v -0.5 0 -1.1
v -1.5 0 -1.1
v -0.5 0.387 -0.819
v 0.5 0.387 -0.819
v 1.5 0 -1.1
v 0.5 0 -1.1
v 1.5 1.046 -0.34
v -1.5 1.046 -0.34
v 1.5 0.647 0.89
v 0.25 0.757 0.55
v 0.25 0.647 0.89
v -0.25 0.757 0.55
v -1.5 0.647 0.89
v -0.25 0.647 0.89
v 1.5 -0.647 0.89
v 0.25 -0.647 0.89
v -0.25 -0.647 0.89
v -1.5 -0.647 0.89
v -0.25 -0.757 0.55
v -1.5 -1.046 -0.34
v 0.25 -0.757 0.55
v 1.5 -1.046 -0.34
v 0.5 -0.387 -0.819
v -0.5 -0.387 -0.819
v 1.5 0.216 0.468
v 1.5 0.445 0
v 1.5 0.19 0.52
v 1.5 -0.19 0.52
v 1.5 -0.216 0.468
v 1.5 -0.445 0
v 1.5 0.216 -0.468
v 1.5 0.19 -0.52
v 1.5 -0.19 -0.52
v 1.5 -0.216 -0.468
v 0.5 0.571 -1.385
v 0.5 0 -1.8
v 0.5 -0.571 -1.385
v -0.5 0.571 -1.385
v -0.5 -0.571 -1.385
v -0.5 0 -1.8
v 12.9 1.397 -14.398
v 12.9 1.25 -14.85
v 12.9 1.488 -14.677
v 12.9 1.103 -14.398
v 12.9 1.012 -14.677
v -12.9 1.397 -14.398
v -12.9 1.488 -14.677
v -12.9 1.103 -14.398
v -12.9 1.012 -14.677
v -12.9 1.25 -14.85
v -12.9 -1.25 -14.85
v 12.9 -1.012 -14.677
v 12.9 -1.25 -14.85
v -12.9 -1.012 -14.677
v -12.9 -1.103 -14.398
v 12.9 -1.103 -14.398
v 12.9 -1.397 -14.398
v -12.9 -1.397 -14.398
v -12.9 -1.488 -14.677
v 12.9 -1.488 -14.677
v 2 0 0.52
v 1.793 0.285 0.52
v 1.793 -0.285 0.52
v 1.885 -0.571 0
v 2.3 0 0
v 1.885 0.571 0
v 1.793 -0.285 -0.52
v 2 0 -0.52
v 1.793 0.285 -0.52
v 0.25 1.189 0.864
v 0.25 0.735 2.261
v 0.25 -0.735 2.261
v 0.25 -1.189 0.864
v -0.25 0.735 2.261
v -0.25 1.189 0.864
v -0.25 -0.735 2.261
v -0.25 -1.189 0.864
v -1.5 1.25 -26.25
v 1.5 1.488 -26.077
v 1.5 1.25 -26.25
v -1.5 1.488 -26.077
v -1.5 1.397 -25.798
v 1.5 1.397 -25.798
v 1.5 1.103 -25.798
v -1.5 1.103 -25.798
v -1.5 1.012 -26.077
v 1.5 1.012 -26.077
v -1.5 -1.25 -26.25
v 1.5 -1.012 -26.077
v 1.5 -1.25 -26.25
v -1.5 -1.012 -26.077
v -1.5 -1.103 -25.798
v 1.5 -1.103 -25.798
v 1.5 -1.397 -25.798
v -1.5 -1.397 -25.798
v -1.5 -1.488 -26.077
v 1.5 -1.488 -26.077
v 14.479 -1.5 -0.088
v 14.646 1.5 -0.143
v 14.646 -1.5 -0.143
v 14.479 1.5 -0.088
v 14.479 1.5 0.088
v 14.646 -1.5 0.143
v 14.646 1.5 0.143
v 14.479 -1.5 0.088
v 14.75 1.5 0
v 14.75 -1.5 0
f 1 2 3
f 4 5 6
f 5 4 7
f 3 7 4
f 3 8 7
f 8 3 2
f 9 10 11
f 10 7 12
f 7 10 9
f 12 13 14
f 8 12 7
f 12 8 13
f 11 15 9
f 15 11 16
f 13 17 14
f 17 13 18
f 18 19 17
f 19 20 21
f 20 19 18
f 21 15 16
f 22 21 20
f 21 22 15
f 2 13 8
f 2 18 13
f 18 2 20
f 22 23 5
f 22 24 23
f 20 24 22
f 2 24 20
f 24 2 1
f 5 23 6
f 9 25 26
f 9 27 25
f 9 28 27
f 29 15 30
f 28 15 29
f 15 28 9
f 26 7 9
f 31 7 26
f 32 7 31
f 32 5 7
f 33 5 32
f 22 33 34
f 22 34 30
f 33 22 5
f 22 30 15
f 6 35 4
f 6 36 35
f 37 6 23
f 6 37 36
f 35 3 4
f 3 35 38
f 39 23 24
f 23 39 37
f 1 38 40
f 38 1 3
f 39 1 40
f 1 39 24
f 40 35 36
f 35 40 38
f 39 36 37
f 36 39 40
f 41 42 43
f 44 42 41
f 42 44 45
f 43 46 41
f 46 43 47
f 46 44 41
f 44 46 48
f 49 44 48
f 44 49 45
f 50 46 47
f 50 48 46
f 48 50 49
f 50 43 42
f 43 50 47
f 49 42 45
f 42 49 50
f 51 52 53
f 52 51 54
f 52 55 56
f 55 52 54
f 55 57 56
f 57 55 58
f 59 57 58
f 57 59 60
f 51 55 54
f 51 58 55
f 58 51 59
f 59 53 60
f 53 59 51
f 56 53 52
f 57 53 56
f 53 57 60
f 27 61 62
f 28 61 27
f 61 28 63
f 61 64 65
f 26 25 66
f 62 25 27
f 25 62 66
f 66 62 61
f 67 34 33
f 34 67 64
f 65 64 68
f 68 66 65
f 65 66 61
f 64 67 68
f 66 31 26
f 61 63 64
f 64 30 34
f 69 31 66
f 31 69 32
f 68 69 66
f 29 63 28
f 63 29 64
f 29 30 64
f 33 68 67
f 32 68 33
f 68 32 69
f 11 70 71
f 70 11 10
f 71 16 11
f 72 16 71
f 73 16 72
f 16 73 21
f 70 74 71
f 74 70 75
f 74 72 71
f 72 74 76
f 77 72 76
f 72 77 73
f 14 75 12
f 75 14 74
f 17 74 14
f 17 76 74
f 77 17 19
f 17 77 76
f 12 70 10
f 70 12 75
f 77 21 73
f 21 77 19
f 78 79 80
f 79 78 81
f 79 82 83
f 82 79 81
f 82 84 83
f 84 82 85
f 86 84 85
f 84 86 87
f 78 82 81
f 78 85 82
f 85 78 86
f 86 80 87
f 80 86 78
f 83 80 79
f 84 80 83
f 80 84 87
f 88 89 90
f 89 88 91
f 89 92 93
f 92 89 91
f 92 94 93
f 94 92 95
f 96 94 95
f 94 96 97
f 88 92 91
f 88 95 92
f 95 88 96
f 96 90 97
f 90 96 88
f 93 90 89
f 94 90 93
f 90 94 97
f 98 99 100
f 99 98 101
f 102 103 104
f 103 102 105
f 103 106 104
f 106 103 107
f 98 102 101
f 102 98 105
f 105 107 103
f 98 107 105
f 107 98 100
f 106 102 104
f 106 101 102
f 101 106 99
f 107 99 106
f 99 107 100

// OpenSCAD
// Parameters
bead_d = 2.2; //[1.1:4.4:0.1]
bead_l = 3; //[1.5:6:0.1]
lead_d = 0.5; //[0.25:1:0.05]
lead_len = 25; //[12.5:50:0.5]
lead_pitch = 2.5; //[1.25:5:0.1]
neck_d = 1.2; //[0.6:2.4:0.1]
neck_l = 1; //[0.5:2:0.1]
overlap = 0.8; //[0.5:2:0.1]
mark_band_w = 0.5; //[0.25:1.2:0.05]
mark_band_t = 0.15; //[0.05:0.4:0.05]
tin_len = 3; //[1.5:8:0.5]
fillet_r = 0.6; //[0.3:1.2:0.05]
ref_d = 0.3; //[0.2:0.8:0.05]

// Geometry
module ntc_bead_body() {
  rotate([0, 90, 0])
    translate([0, 0, 0])
      cylinder(r=bead_d/2, h=bead_l, center=true);
}

module lead_exit_neck() {
  rotate([0, 90, 0])
    translate([bead_l/2 + neck_l/2 - overlap, 0, 0])
      cylinder(r=neck_d/2, h=neck_l, center=true);
}

module lead_1() {
  rotate([0, 90, 0])
    translate([bead_l/2 + neck_l - overlap + (lead_len + overlap)/2, lead_pitch/2, 0])
      cylinder(r=lead_d/2, h=lead_len + overlap, center=true);
}

module lead_2() {
  rotate([0, 90, 0])
    translate([bead_l/2 + neck_l - overlap + (lead_len + overlap)/2, -lead_pitch/2, 0])
      cylinder(r=lead_d/2, h=lead_len + overlap, center=true);
}

module small_fillet_at_lead_to_body_transition() {
  translate([bead_l/2 + neck_l - overlap, 0, 0])
    sphere(r=fillet_r, center=true);
}

module body_marking_band_or_dot() {
  rotate([0, 90, 0])
    translate([-bead_l/2 + mark_band_w/2, 0, 0])
      cylinder(r=bead_d/2 + mark_band_t, h=mark_band_w, center=true);
}

module lead_tinning_tip_sections_1() {
  rotate([0, 90, 0])
    translate([bead_l/2 + neck_l - overlap + (lead_len + overlap) - tin_len/2, lead_pitch/2, 0])
      cylinder(r=lead_d/2, h=tin_len, center=true);
}

module lead_tinning_tip_sections_2() {
  rotate([0, 90, 0])
    translate([bead_l/2 + neck_l - overlap + (lead_len + overlap) - tin_len/2, -lead_pitch/2, 0])
      cylinder(r=lead_d/2, h=tin_len, center=true);
}

module lead_spacing_reference() {
  rotate([90, 0, 0])
    translate([bead_l/2 + neck_l - overlap + (lead_len + overlap)/2, 0, 0])
      cylinder(r=ref_d/2, h=lead_pitch + lead_d, center=true);
}

// Final assembly
module thermistor_union_all() {
  union() {
    ntc_bead_body();
    lead_exit_neck();
    lead_1();
    lead_2();
    small_fillet_at_lead_to_body_transition();
    body_marking_band_or_dot();
    lead_tinning_tip_sections_1();
    lead_tinning_tip_sections_2();
    lead_spacing_reference();
  }
}

// Render the final thermistor model
thermistor_union_all();
